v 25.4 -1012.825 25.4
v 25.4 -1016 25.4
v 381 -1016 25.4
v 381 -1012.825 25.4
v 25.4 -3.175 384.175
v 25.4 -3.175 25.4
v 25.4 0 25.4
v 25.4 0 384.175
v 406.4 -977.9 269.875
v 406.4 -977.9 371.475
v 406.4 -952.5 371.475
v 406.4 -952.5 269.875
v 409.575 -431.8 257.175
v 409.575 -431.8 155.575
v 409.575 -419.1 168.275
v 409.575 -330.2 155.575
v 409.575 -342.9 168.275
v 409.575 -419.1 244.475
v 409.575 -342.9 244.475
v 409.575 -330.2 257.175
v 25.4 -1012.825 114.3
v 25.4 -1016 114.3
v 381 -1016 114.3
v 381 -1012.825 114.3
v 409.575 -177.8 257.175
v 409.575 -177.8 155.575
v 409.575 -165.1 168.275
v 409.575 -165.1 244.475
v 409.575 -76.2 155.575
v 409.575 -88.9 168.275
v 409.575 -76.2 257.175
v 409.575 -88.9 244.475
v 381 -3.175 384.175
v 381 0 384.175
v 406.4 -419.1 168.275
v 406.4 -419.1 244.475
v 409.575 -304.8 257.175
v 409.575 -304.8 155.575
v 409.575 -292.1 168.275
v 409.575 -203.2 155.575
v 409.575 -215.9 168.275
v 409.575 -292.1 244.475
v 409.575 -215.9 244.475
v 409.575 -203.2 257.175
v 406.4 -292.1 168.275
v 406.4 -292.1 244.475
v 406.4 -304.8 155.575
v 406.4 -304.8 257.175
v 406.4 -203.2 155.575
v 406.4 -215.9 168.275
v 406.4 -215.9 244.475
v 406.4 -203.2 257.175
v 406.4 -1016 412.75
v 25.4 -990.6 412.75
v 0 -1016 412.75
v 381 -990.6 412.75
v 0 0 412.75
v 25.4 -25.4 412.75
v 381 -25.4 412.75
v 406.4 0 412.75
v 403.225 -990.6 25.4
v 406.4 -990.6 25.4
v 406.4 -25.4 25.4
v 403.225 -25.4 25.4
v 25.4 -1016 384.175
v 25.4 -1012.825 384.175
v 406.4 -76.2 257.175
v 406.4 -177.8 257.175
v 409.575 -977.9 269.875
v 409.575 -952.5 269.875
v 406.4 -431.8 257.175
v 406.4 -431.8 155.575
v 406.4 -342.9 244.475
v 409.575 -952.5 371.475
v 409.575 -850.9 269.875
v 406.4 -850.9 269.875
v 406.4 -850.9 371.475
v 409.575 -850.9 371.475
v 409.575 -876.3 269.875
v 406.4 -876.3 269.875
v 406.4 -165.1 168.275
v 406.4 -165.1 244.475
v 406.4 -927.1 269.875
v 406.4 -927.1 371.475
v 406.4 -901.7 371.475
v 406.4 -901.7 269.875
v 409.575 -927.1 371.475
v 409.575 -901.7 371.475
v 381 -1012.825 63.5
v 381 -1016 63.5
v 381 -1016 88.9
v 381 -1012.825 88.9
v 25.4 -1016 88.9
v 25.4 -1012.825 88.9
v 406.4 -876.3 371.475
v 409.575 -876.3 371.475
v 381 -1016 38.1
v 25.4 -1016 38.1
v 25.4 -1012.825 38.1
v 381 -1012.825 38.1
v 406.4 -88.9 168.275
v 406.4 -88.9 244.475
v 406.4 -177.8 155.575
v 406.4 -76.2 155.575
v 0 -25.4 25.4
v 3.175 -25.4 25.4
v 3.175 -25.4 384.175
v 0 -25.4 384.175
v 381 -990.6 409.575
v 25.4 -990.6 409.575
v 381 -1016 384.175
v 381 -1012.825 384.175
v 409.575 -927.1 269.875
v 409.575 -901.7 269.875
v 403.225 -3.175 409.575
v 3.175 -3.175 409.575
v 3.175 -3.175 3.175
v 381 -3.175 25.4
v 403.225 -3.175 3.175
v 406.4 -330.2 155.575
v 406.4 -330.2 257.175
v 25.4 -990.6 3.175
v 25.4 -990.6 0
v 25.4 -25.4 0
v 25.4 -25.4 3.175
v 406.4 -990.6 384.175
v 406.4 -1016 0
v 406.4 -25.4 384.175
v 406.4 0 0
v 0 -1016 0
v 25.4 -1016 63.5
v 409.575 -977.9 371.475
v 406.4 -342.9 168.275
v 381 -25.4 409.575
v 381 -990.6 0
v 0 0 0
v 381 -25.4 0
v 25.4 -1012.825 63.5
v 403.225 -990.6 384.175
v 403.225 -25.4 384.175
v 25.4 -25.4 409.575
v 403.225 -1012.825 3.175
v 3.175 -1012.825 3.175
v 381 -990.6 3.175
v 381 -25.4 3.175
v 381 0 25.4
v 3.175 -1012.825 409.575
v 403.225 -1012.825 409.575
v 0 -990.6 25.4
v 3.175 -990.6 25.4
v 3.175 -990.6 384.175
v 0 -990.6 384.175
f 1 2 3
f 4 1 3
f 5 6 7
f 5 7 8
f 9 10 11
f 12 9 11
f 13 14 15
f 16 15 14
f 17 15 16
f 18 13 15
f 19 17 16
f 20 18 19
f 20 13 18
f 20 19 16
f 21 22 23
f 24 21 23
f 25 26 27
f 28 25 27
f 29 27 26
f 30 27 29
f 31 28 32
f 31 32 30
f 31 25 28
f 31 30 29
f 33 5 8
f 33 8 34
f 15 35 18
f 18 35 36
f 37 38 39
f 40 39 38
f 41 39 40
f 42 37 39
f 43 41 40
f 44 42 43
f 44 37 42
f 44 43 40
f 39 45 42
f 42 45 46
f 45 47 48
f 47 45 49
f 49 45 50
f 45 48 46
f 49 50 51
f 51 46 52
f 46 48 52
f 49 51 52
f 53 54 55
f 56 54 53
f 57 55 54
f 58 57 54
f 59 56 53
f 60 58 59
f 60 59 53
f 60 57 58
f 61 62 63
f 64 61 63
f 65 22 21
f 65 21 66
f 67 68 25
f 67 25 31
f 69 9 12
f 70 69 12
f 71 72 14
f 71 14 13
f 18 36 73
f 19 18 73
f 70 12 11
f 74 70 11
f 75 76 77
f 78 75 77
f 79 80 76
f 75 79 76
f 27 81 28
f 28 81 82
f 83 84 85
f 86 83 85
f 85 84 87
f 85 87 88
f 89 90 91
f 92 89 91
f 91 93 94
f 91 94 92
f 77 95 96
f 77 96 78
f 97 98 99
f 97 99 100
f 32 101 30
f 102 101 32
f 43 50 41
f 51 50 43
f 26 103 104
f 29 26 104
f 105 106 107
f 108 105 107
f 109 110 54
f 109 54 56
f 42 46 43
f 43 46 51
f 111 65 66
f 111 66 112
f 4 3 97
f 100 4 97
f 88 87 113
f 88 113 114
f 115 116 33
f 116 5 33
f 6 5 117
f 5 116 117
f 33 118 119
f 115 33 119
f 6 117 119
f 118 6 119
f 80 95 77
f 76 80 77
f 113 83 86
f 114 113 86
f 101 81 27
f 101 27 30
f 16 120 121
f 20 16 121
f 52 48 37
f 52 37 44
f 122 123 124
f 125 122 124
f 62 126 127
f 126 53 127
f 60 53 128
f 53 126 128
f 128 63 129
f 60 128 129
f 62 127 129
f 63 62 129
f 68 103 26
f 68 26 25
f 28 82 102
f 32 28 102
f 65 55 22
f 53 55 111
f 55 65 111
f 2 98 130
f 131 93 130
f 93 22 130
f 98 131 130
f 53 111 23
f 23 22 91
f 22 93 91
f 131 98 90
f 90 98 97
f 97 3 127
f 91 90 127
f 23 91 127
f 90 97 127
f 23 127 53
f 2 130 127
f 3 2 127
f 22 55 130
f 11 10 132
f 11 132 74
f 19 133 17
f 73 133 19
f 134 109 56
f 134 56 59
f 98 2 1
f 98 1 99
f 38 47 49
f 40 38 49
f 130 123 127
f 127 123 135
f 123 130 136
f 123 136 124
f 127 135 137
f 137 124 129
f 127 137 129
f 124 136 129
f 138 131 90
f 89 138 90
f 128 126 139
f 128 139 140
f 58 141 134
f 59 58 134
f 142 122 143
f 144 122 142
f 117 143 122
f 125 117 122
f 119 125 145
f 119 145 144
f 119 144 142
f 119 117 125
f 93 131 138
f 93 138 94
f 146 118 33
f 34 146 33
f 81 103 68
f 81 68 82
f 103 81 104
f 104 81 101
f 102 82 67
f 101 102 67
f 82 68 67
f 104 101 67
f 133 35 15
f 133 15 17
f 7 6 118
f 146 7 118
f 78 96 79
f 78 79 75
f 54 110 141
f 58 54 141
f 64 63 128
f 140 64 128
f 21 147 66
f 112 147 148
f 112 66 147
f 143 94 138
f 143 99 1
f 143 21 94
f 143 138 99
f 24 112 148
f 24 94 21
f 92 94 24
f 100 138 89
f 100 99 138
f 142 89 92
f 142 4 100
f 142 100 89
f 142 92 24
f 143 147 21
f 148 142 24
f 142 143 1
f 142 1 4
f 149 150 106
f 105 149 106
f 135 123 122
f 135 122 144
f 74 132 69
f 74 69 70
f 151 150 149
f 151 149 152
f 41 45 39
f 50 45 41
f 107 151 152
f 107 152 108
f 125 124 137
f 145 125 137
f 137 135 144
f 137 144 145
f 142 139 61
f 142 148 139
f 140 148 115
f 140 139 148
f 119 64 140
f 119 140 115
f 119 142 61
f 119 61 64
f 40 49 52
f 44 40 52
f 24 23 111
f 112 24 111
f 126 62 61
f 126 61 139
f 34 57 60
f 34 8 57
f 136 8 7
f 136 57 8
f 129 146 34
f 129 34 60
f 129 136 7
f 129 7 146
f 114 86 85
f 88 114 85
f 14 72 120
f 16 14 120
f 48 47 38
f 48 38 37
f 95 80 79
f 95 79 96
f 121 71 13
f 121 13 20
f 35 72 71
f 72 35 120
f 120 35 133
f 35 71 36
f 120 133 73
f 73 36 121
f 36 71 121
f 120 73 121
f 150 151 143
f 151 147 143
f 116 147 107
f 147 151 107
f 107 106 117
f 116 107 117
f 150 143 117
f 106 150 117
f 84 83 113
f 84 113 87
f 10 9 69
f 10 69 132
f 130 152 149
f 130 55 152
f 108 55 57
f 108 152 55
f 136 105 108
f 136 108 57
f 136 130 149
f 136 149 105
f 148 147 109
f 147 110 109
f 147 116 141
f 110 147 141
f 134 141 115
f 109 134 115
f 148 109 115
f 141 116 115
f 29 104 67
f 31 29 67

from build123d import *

# Parameters (mm, degrees)
F0_W      = 406.4
F0_H      = 1016
F0_W_2    = 355.6
F0_H_2    = 965.2
F1_DEPTH  = 3.175
F2_W      = 406.4
F2_H      = 1016
F2_W_2    = 400.05
F2_H_2    = 1009.65
F3_DEPTH  = 406.4
F4_W      = 965.2
F4_H      = 358.775
F5_DEPTH  = 406.401
F6_W      = 355.6
F6_H      = 358.775
F7_DEPTH  = 1016.001
F8_W      = 406.4
F8_H      = 1016
F8_W_2    = 400.05
F8_H_2    = 1009.65
F8_W_3    = 355.6
F8_H_3    = 965.2
F9_DEPTH  = 3.175
F10_W     = 101.6
F10_H     = 101.6
F10_W_2   = 76.2
F10_H_2   = 76.2
F11_DEPTH = 3.175
F10_W_3   = 25.4
F12_W     = 355.6
F12_H     = 25.4
F13_DEPTH = 3.175


with BuildPart() as f1:
    # F0 (on Top) → F1 (new body)
    with BuildSketch(Plane.XY):
        with Locations((203.2, -508)):
            Rectangle(F0_W, F0_H)
        with Locations((203.2, -508)):
            Rectangle(F0_W_2, F0_H_2, mode=Mode.SUBTRACT)
    extrude(amount=F1_DEPTH)

    # F2 (on face) → F3 (join)
    with BuildSketch(Plane.XY.offset(3.175)):
        with Locations((203.2, -508)):
            Rectangle(F2_W, F2_H)
        with Locations((203.2, -508)):
            Rectangle(F2_W_2, F2_H_2, mode=Mode.SUBTRACT)
    extrude(amount=F3_DEPTH)

    # F4 (on face) → F5 (cut, through all)
    with BuildSketch(Plane.YZ.offset(406.4)):
        with Locations((-508, 204.7875)):
            Rectangle(F4_W, F4_H)
    extrude(amount=-F5_DEPTH, mode=Mode.SUBTRACT)

    # F6 (on face) → F7 (cut, through all)
    with BuildSketch(Plane.XZ.offset(1016)):
        with Locations((203.2, 204.7875)):
            Rectangle(F6_W, F6_H)
    extrude(amount=-F7_DEPTH, mode=Mode.SUBTRACT)

    # F8 (on face) → F9 (join)
    with BuildSketch(Plane.XY.offset(409.575)):
        with Locations((203.2, -508)):
            Rectangle(F8_W, F8_H)
        with Locations((203.2, -508)):
            Rectangle(F8_W_2, F8_H_2, mode=Mode.SUBTRACT)
        with Locations((203.2, -508)):
            Rectangle(F8_W_2, F8_H_2)
        with Locations((203.2, -508)):
            Rectangle(F8_W_3, F8_H_3, mode=Mode.SUBTRACT)
    extrude(amount=F9_DEPTH)

    # F12 (on face) → F13 (join)
    with BuildSketch(Plane.XZ.offset(1016)):
        with Locations((203.2, 101.6)):
            Rectangle(F12_W, F12_H)
        with Locations((203.2, 50.8)):
            Rectangle(F12_W, F12_H)
    extrude(amount=-F13_DEPTH)


with BuildPart() as f11:
    # F10 (on face) → F11 (new body)
    with BuildSketch(Plane.YZ.offset(406.4)):
        with Locations((-254, 206.375)):
            Rectangle(F10_W, F10_H)
        with Locations((-254, 206.375)):
            Rectangle(F10_W_2, F10_H_2, mode=Mode.SUBTRACT)
    extrude(amount=F11_DEPTH)


with BuildPart() as f11b:
    # F10 (on face) → F11, piece 2 (new body)
    with BuildSketch(Plane.YZ.offset(406.4)):
        with Locations((-127, 206.375)):
            Rectangle(F10_W, F10_H)
        with Locations((-127, 206.375)):
            Rectangle(F10_W_2, F10_H_2, mode=Mode.SUBTRACT)
    extrude(amount=F11_DEPTH)


with BuildPart() as f11c:
    # F10 (on face) → F11, piece 3 (new body)
    with BuildSketch(Plane.YZ.offset(406.4)):
        with Locations((-381, 206.375)):
            Rectangle(F10_W, F10_H)
        with Locations((-381, 206.375)):
            Rectangle(F10_W_2, F10_H_2, mode=Mode.SUBTRACT)
    extrude(amount=F11_DEPTH)


with BuildPart() as f11d:
    # F10 (on face) → F11, piece 4 (new body)
    with BuildSketch(Plane.YZ.offset(406.4)):
        with Locations((-914.4, 320.675)):
            Rectangle(F10_W_3, F10_H)
    extrude(amount=F11_DEPTH)


with BuildPart() as f11e:
    # F10 (on face) → F11, piece 5 (new body)
    with BuildSketch(Plane.YZ.offset(406.4)):
        with Locations((-965.2, 320.675)):
            Rectangle(F10_W_3, F10_H)
    extrude(amount=F11_DEPTH)


with BuildPart() as f11f:
    # F10 (on face) → F11, piece 6 (new body)
    with BuildSketch(Plane.YZ.offset(406.4)):
        with Locations((-863.6, 320.675)):
            Rectangle(F10_W_3, F10_H)
    extrude(amount=F11_DEPTH)


solid = Compound([f1.part, f11.part, f11b.part, f11c.part, f11d.part, f11e.part, f11f.part])
